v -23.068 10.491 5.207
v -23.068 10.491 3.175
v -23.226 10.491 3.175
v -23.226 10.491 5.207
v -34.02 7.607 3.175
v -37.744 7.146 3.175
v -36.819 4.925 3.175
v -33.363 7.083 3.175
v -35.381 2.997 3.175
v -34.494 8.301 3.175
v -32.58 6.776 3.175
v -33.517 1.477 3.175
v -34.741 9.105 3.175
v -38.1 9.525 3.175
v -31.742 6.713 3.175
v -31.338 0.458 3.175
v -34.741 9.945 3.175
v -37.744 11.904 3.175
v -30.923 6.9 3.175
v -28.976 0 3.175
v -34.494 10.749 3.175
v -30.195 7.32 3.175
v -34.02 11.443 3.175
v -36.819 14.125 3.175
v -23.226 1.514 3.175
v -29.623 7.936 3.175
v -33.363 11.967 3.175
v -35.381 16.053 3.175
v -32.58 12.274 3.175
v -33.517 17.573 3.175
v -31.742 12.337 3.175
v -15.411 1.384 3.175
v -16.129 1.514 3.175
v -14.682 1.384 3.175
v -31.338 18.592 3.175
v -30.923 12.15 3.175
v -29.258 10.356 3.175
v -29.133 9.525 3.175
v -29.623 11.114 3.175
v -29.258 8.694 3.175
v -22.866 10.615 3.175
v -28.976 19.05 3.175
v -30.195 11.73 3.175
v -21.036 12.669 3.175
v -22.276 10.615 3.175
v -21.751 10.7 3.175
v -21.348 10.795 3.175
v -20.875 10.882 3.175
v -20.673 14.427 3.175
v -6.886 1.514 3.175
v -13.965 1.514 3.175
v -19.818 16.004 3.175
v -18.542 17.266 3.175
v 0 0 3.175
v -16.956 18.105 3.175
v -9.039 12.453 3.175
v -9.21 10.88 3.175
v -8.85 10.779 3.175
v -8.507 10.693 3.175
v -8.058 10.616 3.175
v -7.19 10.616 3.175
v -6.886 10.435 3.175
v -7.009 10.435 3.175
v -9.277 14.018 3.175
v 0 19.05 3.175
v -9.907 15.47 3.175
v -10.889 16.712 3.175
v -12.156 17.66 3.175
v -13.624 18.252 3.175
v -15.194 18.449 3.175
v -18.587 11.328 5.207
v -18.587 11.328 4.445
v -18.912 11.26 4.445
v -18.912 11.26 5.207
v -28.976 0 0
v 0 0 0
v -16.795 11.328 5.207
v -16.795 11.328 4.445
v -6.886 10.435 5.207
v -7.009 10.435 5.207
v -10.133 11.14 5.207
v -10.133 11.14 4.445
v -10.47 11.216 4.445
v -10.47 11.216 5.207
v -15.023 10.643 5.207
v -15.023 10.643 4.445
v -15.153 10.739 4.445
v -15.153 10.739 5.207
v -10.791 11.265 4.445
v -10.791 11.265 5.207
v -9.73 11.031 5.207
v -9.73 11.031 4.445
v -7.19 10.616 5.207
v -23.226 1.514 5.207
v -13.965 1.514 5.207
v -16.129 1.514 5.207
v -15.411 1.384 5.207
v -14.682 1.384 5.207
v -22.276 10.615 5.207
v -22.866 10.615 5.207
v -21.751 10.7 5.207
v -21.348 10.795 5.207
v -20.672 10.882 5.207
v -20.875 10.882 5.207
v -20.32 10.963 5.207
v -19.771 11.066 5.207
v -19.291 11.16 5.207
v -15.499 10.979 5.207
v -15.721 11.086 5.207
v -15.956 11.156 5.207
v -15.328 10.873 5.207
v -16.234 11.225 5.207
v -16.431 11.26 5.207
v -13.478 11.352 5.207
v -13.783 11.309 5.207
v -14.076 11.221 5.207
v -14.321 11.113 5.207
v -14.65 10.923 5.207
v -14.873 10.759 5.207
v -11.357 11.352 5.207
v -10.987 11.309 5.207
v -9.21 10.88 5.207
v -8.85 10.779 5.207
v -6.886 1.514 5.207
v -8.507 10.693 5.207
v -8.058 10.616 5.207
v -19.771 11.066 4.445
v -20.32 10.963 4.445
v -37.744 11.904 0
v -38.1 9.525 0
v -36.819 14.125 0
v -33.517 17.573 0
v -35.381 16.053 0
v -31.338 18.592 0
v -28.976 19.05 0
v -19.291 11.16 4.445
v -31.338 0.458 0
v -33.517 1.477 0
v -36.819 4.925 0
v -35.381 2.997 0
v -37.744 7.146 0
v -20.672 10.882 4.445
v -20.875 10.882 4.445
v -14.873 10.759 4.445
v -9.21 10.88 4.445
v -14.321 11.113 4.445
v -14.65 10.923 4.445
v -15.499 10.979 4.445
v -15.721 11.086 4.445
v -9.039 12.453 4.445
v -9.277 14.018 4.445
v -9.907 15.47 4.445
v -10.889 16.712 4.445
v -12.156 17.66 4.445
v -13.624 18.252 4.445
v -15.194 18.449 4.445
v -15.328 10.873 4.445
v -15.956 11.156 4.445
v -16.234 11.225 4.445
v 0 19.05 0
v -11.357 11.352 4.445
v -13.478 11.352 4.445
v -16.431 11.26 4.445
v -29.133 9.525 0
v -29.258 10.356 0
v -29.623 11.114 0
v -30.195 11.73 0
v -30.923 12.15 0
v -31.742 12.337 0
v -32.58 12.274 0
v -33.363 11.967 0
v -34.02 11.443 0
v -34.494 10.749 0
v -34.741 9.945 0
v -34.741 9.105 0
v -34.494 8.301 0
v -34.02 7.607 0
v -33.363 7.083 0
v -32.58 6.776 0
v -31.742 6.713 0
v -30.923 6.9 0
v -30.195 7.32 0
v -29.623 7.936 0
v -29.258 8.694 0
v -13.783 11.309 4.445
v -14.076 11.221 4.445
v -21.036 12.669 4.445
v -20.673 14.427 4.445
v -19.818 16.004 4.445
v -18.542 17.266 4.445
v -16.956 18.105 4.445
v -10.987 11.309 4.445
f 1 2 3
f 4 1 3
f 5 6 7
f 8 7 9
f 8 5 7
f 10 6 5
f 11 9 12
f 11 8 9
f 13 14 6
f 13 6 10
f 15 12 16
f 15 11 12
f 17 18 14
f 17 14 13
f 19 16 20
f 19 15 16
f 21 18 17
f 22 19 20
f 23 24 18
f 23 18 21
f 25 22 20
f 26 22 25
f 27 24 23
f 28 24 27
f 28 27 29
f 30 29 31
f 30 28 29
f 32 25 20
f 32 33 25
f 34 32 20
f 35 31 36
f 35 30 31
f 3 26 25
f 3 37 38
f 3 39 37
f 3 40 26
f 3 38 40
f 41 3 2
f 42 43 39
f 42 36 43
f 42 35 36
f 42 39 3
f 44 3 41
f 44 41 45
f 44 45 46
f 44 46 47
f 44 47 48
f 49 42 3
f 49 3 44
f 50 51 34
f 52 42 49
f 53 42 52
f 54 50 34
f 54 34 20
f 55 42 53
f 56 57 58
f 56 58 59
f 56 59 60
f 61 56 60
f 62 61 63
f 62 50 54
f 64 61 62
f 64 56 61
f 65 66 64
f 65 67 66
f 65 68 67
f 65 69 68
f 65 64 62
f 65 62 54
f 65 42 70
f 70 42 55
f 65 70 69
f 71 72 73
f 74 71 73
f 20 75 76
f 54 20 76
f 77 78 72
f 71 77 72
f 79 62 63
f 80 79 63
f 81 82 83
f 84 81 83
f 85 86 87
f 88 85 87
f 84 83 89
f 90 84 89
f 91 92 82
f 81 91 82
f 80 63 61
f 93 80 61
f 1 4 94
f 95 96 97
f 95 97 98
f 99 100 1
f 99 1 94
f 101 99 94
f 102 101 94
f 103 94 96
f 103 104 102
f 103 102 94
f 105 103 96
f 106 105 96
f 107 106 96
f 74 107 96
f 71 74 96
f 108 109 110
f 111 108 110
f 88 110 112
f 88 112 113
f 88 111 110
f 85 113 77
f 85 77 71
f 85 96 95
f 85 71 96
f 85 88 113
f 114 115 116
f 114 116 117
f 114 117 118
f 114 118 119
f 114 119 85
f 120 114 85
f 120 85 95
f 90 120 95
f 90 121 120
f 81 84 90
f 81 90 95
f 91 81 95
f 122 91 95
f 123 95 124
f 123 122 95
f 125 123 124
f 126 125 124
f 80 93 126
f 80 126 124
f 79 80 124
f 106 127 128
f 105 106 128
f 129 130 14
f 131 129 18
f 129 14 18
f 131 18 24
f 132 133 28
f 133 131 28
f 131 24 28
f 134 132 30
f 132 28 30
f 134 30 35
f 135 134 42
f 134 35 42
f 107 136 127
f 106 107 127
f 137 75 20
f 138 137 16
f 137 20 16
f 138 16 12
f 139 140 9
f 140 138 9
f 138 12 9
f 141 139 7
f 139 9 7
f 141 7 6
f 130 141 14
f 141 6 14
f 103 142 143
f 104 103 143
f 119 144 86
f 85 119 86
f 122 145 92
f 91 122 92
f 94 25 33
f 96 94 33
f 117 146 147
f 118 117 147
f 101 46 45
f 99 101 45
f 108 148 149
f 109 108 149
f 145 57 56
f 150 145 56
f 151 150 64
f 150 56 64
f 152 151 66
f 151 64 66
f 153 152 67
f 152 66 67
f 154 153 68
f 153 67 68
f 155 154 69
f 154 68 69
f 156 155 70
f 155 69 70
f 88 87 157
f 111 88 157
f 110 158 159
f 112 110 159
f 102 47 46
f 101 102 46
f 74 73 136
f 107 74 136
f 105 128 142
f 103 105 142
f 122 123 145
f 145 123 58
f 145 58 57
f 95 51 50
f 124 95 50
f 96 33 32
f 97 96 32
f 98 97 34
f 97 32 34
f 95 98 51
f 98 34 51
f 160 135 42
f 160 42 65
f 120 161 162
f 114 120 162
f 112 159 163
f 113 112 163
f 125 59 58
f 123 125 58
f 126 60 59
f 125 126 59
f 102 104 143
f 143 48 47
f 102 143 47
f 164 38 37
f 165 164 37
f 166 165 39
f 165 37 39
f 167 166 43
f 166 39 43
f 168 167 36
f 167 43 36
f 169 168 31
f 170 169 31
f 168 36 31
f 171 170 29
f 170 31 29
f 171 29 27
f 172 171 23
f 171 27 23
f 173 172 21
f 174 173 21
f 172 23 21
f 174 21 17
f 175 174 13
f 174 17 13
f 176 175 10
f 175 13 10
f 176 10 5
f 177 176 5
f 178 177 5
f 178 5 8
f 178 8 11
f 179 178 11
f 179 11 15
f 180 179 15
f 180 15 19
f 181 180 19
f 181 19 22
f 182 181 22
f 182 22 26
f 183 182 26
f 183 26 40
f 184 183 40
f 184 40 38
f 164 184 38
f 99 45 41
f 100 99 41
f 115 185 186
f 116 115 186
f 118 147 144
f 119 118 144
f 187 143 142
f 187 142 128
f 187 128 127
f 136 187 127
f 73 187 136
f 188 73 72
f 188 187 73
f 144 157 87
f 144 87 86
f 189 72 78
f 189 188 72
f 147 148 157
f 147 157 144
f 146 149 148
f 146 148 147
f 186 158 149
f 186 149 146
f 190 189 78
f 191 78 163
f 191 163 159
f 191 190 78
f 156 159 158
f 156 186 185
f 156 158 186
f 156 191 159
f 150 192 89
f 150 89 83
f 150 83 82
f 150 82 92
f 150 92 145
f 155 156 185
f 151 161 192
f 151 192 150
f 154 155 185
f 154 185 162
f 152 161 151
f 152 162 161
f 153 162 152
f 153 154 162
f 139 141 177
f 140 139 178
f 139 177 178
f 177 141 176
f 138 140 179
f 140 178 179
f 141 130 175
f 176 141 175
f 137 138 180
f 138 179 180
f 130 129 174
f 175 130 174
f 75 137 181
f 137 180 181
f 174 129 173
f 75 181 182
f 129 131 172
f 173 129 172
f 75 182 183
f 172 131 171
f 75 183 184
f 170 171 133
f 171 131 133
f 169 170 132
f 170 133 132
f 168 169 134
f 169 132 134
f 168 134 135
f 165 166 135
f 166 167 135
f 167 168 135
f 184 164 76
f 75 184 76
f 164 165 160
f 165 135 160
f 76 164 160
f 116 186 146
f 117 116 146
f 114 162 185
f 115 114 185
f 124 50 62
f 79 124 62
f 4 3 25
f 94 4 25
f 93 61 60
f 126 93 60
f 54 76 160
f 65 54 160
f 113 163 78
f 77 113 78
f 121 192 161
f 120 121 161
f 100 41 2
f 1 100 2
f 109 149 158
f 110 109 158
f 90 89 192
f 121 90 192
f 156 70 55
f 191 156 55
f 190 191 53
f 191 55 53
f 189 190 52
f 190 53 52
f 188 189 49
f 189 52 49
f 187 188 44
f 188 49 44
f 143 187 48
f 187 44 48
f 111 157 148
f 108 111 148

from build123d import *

# Parameters (mm, degrees)
F0_W     = 38.1
F0_H     = 19.05
F1_DEPTH = 3.175
F2_R     = 2.81996
F3_DEPTH = 3.176
F5_DEPTH = 1.27
F6_DEPTH = 2.032


with BuildPart() as f1:
    # F0 (on Top) → F1 (new body)
    with BuildSketch(Plane.XY):
        with Locations((-19.05, 9.525)):
            Rectangle(F0_W, F0_H)
    extrude(amount=F1_DEPTH)

    # F2 (on face) → F3 (cut, through all)
    with BuildSketch(Plane.XY.offset(3.175)):
        with BuildLine():
            ThreePointArc((-38.1, 9.525), (-35.381374, 16.053134), (-28.9762, 19.05))
            Line((-28.9762, 19.05), (-38.1, 19.05))
            Line((-38.1, 19.05), (-38.1, 9.525))
        make_face()
        with BuildLine():
            ThreePointArc((-28.9762, 0), (-35.381374, 2.996866), (-38.1, 9.525))
            Line((-38.1, 9.525), (-38.1, 0))
            Line((-38.1, 0), (-28.9762, 0))
        make_face()
        with Locations((-31.952918, 9.525)):
            Circle(F2_R)
    extrude(amount=-F3_DEPTH, mode=Mode.SUBTRACT)

    # F4 (on face) → F5 (join)
    with BuildSketch(Plane.XY.offset(3.175)):
        with BuildLine():
            ThreePointArc((-15.194452, 18.448619), (-19.817669, 16.003864), (-20.874732, 10.881991))
            Line((-20.874732, 10.881991), (-20.671532, 10.881991))
            Line((-20.671532, 10.881991), (-20.320076, 10.963324))
            Line((-20.320076, 10.963324), (-19.771464, 11.066189))
            Line((-19.771464, 11.066189), (-19.291429, 11.160482))
            Line((-19.291429, 11.160482), (-18.911961, 11.260434))
            Line((-18.911961, 11.260434), (-18.586872, 11.327949))
            Line((-18.586872, 11.327949), (-18.261783, 11.327949))
            Line((-18.261783, 11.327949), (-17.762255, 11.327949))
            Line((-17.762255, 11.327949), (-17.223081, 11.327949))
            Line((-17.223081, 11.327949), (-16.794914, 11.327949))
            Line((-16.794914, 11.327949), (-16.431164, 11.260434))
            Line((-16.431164, 11.260434), (-16.233785, 11.225344))
            Line((-16.233785, 11.225344), (-15.955806, 11.155849))
            Line((-15.955806, 11.155849), (-15.720593, 11.086354))
            Line((-15.720593, 11.086354), (-15.498744, 10.979439))
            Line((-15.498744, 10.979439), (-15.327681, 10.872524))
            Line((-15.327681, 10.872524), (-15.15326, 10.739213))
            Line((-15.15326, 10.739213), (-15.022739, 10.64253))
            Line((-15.022739, 10.64253), (-14.872882, 10.758549))
            Line((-14.872882, 10.758549), (-14.649567, 10.92315))
            Line((-14.649567, 10.92315), (-14.321024, 11.11269))
            Line((-14.321024, 11.11269), (-14.07626, 11.221474))
            Line((-14.07626, 11.221474), (-13.782543, 11.308501))
            Line((-13.782543, 11.308501), (-13.477948, 11.352015))
            Line((-13.477948, 11.352015), (-13.238624, 11.352015))
            Line((-13.238624, 11.352015), (-12.885077, 11.352015))
            Line((-12.885077, 11.352015), (-12.553286, 11.352015))
            Line((-12.553286, 11.352015), (-12.145346, 11.352015))
            Line((-12.145346, 11.352015), (-11.748285, 11.352015))
            Line((-11.748285, 11.352015), (-11.356664, 11.352015))
            Line((-11.356664, 11.352015), (-10.986798, 11.308501))
            Line((-10.986798, 11.308501), (-10.790988, 11.264987))
            Line((-10.790988, 11.264987), (-10.470076, 11.216035))
            Line((-10.470076, 11.216035), (-10.132845, 11.139886))
            Line((-10.132845, 11.139886), (-9.730345, 11.031102))
            Line((-9.730345, 11.031102), (-9.210265, 10.879805))
            ThreePointArc((-9.210265, 10.879805), (-10.357813, 16.122579), (-15.194452, 18.448619))
        make_face()
    extrude(amount=F5_DEPTH)

    # F4 (on face) → F6 (join)
    with BuildSketch(Plane.XY.offset(3.175)):
        with BuildLine():
            Line((-23.068097, 10.490683), (-23.225745, 10.490683))
            Line((-23.225745, 10.490683), (-23.225745, 1.513947))
            Line((-23.225745, 1.513947), (-16.128955, 1.513947))
            ThreePointArc((-16.128955, 1.513947), (-15.046753, 1.367138), (-13.964551, 1.513947))
            Line((-13.964551, 1.513947), (-6.886078, 1.513947))
            Line((-6.886078, 1.513947), (-6.886078, 10.435192))
            Line((-6.886078, 10.435192), (-7.009125, 10.435192))
            Line((-7.009125, 10.435192), (-7.190363, 10.616429))
            Line((-7.190363, 10.616429), (-7.648225, 10.616429))
            Line((-7.648225, 10.616429), (-8.058394, 10.616429))
            Line((-8.058394, 10.616429), (-8.506718, 10.69274))
            Line((-8.506718, 10.69274), (-8.850115, 10.778589))
            Line((-8.850115, 10.778589), (-9.210265, 10.879805))
            Line((-9.210265, 10.879805), (-9.730345, 11.031102))
            Line((-9.730345, 11.031102), (-10.132845, 11.139886))
            Line((-10.132845, 11.139886), (-10.470076, 11.216035))
            Line((-10.470076, 11.216035), (-10.790988, 11.264987))
            Line((-10.790988, 11.264987), (-10.986798, 11.308501))
            Line((-10.986798, 11.308501), (-11.356664, 11.352015))
            Line((-11.356664, 11.352015), (-11.748285, 11.352015))
            Line((-11.748285, 11.352015), (-12.145346, 11.352015))
            Line((-12.145346, 11.352015), (-12.553286, 11.352015))
            Line((-12.553286, 11.352015), (-12.885077, 11.352015))
            Line((-12.885077, 11.352015), (-13.238624, 11.352015))
            Line((-13.238624, 11.352015), (-13.477948, 11.352015))
            Line((-13.477948, 11.352015), (-13.782543, 11.308501))
            Line((-13.782543, 11.308501), (-14.07626, 11.221474))
            Line((-14.07626, 11.221474), (-14.321024, 11.11269))
            Line((-14.321024, 11.11269), (-14.649567, 10.92315))
            Line((-14.649567, 10.92315), (-14.872882, 10.758549))
            Line((-14.872882, 10.758549), (-15.022739, 10.64253))
            Line((-15.022739, 10.64253), (-15.15326, 10.739213))
            Line((-15.15326, 10.739213), (-15.327681, 10.872524))
            Line((-15.327681, 10.872524), (-15.498744, 10.979439))
            Line((-15.498744, 10.979439), (-15.720593, 11.086354))
            Line((-15.720593, 11.086354), (-15.955806, 11.155849))
            Line((-15.955806, 11.155849), (-16.233785, 11.225344))
            Line((-16.233785, 11.225344), (-16.431164, 11.260434))
            Line((-16.431164, 11.260434), (-16.794914, 11.327949))
            Line((-16.794914, 11.327949), (-17.223081, 11.327949))
            Line((-17.223081, 11.327949), (-17.762255, 11.327949))
            Line((-17.762255, 11.327949), (-18.261783, 11.327949))
            Line((-18.261783, 11.327949), (-18.586872, 11.327949))
            Line((-18.586872, 11.327949), (-18.911961, 11.260434))
            Line((-18.911961, 11.260434), (-19.291429, 11.160482))
            Line((-19.291429, 11.160482), (-19.771464, 11.066189))
            Line((-19.771464, 11.066189), (-20.320076, 10.963324))
            Line((-20.320076, 10.963324), (-20.671532, 10.881991))
            Line((-20.671532, 10.881991), (-20.874732, 10.881991))
            Line((-20.874732, 10.881991), (-21.348417, 10.795149))
            Line((-21.348417, 10.795149), (-21.751048, 10.700412))
            Line((-21.751048, 10.700412), (-22.276284, 10.614889))
            Line((-22.276284, 10.614889), (-22.866262, 10.614889))
            Line((-22.866262, 10.614889), (-23.068097, 10.490683))
        make_face()
    extrude(amount=F6_DEPTH)


solid = f1.part
